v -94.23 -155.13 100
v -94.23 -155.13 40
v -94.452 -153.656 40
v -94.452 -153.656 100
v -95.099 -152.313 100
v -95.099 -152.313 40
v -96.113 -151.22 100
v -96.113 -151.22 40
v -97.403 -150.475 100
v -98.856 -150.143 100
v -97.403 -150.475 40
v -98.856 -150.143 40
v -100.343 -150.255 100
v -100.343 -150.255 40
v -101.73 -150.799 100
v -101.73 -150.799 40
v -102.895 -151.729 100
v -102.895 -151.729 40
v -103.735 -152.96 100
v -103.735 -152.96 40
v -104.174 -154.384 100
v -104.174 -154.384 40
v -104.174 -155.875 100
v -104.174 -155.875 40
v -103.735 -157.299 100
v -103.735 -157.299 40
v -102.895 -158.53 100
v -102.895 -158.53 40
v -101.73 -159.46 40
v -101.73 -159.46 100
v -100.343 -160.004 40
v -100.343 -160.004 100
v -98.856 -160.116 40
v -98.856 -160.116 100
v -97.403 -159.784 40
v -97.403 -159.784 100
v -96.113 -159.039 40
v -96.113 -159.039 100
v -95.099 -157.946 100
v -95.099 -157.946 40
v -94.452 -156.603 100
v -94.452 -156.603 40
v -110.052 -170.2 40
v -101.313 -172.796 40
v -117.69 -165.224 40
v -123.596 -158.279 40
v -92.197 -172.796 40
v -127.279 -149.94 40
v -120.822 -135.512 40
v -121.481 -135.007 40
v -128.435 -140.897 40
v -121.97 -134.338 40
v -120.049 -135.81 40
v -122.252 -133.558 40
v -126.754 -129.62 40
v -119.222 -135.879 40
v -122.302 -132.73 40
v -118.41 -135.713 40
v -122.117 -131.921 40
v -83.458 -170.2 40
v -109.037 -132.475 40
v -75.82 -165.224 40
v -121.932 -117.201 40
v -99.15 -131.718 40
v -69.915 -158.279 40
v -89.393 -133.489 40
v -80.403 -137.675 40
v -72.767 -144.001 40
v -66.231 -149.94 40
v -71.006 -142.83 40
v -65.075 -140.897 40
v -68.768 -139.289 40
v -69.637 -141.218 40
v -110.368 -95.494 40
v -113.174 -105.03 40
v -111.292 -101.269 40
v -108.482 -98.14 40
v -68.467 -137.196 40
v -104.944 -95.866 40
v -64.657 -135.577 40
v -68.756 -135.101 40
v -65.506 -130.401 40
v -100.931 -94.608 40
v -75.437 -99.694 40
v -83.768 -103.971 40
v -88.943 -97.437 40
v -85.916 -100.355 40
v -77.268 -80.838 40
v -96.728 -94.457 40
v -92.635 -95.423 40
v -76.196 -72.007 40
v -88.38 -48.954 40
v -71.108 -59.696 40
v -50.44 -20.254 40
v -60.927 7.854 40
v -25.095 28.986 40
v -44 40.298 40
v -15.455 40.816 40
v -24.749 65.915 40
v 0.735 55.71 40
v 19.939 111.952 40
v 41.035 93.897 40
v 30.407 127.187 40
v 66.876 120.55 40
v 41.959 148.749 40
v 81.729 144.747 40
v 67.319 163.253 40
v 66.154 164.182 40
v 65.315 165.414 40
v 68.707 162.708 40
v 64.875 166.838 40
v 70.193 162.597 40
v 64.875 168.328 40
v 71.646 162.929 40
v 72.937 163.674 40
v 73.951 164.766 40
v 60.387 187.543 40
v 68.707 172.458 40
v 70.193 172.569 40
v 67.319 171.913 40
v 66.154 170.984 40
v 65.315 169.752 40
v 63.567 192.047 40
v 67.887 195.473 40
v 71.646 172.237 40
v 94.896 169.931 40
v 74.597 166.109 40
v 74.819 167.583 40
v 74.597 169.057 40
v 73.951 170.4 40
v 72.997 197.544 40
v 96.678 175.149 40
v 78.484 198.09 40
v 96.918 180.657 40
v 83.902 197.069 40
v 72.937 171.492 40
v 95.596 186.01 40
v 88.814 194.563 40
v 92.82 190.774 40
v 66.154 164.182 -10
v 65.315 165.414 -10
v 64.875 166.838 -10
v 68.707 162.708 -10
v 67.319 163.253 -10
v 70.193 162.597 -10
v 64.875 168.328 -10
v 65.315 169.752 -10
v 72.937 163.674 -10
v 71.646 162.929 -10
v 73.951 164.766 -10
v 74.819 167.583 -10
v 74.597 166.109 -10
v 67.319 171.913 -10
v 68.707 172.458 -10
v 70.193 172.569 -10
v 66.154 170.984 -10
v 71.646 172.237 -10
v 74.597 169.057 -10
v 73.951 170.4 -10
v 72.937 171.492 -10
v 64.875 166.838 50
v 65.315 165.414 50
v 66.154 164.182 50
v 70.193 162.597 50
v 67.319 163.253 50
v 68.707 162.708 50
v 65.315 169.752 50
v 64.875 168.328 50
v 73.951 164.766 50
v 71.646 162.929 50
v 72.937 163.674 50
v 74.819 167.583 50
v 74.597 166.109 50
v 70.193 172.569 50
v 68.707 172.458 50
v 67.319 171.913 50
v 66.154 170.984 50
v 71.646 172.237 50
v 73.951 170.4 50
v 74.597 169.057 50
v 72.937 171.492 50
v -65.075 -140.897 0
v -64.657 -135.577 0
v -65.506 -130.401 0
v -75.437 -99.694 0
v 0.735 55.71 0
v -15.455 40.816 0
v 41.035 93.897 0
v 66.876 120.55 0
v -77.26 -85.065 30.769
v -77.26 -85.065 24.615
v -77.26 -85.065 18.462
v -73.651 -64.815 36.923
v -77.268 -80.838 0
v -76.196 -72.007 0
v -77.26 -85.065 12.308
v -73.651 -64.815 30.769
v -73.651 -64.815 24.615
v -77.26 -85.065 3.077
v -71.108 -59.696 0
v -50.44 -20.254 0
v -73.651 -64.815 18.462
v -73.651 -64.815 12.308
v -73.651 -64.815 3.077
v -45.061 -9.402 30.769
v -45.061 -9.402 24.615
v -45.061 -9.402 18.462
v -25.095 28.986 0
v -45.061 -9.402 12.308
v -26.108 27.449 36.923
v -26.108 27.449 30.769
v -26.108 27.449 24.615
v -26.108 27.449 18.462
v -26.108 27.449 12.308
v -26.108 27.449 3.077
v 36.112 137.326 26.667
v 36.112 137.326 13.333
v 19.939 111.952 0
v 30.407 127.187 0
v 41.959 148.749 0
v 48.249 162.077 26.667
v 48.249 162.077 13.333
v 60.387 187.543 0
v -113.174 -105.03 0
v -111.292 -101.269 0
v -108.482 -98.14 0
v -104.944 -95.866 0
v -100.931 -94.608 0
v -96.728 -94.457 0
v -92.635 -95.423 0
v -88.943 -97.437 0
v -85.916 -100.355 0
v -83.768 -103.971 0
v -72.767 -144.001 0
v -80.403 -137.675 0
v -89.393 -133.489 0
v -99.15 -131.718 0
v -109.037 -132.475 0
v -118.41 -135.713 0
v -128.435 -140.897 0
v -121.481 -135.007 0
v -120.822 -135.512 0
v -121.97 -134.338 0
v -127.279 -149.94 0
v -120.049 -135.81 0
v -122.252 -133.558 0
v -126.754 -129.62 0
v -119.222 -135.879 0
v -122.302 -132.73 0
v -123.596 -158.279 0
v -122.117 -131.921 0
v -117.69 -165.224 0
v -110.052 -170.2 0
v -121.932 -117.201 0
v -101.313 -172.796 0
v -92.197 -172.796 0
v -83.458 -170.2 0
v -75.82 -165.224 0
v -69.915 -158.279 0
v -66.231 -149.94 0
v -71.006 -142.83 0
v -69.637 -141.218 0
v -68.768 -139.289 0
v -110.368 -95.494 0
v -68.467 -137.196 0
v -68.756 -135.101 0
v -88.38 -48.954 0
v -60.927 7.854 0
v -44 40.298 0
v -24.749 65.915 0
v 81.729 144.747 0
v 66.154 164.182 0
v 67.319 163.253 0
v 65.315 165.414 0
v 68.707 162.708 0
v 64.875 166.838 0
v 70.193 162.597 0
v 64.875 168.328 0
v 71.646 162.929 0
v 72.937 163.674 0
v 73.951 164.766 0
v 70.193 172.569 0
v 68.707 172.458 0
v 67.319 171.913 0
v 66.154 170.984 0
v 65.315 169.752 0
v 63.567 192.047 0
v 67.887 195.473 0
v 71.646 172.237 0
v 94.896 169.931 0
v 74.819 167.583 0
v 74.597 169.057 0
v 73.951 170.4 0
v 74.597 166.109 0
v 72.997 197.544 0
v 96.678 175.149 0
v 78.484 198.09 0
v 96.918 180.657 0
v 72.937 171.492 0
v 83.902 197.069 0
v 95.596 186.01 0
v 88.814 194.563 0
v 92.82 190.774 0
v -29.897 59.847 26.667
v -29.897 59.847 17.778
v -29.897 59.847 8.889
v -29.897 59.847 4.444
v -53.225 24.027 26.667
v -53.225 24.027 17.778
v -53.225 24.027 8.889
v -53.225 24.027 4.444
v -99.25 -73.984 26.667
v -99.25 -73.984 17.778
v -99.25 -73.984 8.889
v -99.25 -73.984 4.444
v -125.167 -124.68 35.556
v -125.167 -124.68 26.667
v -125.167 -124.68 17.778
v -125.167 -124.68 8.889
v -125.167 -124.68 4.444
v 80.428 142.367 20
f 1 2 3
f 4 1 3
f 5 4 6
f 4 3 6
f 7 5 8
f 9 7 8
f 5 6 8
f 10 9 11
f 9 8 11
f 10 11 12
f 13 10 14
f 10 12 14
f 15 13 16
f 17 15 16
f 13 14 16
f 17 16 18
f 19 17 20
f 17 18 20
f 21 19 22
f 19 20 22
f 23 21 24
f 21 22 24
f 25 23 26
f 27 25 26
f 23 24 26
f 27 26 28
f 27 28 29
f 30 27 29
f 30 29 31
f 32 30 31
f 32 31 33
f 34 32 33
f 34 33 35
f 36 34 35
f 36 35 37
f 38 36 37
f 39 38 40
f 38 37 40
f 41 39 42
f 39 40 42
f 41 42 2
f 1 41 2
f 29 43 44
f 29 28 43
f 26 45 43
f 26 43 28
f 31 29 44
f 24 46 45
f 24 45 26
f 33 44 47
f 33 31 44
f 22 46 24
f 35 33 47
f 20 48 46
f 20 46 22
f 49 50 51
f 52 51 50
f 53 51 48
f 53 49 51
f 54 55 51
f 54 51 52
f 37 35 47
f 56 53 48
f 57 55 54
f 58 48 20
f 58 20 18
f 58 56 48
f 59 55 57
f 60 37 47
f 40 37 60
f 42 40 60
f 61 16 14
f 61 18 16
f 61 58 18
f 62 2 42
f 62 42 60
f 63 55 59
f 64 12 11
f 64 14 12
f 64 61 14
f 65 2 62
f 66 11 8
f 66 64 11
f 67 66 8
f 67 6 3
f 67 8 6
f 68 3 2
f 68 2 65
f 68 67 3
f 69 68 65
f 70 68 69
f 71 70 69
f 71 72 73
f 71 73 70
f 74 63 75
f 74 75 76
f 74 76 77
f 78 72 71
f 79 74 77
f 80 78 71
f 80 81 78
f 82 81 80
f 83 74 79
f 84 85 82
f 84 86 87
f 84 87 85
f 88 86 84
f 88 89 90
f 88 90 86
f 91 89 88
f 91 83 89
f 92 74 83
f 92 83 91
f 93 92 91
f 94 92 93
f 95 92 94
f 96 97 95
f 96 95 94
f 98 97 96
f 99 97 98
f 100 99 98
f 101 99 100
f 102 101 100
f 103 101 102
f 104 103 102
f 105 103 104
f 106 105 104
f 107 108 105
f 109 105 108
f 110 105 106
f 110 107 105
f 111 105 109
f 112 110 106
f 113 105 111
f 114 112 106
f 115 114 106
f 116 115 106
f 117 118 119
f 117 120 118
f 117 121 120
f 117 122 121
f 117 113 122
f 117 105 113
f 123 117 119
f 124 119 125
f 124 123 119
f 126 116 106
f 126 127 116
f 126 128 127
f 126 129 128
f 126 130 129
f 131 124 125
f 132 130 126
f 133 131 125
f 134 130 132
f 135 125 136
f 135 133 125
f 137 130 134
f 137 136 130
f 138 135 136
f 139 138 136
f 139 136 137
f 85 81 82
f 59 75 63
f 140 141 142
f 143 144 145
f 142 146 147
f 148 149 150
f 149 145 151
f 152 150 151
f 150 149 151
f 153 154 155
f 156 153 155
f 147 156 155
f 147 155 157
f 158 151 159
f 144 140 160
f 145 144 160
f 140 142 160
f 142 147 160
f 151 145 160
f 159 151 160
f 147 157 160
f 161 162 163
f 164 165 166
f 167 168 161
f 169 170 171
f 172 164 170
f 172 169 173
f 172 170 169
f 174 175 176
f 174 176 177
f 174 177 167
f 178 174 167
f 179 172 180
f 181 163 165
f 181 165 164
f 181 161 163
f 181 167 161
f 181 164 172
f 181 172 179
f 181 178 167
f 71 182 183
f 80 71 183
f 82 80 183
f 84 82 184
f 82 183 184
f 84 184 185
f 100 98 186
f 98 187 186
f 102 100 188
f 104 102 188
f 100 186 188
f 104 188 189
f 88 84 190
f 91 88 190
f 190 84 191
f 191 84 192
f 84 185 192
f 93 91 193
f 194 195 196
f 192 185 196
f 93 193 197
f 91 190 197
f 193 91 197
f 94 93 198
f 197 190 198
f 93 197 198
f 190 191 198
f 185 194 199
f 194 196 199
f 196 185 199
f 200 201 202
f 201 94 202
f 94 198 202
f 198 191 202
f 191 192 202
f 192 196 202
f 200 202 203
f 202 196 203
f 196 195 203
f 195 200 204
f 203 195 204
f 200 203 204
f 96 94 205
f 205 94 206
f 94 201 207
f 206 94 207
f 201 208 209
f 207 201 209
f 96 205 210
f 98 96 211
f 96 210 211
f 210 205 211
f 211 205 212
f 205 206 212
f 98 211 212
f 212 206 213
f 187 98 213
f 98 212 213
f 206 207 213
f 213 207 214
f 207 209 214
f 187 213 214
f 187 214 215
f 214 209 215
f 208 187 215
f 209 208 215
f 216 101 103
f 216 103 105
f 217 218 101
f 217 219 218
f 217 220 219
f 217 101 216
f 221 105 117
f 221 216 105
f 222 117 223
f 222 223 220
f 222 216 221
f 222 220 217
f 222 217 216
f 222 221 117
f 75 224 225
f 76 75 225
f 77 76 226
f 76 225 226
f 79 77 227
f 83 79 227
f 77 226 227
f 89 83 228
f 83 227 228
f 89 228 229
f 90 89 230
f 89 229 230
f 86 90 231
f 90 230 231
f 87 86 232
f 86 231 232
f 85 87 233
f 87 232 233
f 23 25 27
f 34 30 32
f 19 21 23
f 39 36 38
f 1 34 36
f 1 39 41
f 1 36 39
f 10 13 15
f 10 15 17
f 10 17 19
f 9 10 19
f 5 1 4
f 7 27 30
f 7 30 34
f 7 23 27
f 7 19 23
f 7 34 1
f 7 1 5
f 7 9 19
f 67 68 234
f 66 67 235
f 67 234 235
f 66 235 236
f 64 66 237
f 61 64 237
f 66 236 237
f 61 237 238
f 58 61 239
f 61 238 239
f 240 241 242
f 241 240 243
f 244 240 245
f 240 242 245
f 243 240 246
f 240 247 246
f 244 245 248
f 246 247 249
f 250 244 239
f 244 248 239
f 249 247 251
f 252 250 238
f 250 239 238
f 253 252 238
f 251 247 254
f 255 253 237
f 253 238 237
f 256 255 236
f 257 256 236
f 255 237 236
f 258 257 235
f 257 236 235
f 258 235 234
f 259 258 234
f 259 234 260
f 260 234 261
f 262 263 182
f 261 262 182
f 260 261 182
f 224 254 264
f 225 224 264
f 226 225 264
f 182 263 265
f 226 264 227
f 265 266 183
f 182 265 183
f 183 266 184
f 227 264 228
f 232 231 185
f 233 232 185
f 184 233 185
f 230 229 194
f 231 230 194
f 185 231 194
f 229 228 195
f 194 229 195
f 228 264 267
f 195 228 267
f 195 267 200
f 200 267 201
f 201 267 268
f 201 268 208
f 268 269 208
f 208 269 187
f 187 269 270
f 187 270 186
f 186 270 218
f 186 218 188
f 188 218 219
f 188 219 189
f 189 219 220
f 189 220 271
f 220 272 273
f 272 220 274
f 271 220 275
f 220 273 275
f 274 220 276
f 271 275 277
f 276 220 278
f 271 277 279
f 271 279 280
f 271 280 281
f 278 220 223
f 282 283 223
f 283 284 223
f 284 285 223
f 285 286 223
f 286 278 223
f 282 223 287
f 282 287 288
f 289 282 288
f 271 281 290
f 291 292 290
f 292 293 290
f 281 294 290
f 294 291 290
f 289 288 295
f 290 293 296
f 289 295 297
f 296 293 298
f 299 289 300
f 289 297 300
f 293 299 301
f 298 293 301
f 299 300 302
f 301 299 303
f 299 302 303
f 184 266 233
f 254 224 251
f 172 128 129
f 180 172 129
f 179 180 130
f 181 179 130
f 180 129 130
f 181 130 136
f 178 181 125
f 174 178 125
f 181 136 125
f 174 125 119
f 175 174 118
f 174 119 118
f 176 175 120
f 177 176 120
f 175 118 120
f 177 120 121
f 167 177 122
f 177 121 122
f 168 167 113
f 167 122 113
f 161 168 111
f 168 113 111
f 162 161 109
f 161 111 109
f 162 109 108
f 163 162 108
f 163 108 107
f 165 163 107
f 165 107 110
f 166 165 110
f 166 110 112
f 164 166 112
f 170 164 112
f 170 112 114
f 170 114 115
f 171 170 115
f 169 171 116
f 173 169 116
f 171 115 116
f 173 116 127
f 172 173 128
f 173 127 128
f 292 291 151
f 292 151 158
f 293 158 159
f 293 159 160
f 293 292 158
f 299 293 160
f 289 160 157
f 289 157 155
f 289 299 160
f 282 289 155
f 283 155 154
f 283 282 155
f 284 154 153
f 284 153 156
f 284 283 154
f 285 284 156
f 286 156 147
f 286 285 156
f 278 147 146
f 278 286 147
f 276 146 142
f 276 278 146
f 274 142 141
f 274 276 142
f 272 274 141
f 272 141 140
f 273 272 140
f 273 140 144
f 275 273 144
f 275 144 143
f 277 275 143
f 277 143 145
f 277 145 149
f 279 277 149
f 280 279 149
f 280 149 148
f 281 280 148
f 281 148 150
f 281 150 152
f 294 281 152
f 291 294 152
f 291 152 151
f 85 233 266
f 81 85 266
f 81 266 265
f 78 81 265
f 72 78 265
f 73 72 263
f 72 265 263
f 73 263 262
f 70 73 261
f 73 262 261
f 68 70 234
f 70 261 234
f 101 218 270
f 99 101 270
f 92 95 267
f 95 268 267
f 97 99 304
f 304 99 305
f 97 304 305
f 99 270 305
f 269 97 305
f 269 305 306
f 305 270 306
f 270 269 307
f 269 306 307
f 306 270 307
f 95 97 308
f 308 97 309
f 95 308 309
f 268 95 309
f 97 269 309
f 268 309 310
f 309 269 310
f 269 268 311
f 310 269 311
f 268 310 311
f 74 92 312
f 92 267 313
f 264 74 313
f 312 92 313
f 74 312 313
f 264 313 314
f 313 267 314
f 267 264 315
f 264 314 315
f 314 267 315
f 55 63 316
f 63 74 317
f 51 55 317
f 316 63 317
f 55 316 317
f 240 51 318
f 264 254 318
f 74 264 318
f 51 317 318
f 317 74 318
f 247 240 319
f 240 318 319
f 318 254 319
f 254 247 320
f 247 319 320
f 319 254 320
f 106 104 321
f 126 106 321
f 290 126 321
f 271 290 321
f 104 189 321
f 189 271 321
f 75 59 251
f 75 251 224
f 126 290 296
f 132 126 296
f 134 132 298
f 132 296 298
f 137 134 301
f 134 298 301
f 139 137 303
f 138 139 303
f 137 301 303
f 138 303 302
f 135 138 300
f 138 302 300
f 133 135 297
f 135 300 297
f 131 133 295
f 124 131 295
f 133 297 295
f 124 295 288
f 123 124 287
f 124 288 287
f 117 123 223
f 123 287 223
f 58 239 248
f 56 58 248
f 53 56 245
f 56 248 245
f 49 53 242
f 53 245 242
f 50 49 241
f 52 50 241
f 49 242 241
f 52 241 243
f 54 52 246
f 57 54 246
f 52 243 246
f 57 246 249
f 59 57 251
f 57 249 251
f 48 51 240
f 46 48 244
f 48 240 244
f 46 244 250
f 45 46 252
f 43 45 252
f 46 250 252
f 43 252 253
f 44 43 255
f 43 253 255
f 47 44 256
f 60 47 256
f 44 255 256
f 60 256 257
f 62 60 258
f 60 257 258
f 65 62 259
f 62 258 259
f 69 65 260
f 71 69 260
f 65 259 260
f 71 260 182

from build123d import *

# Parameters (mm, degrees)
BOSS_EXTRUDE1_DEPTH = 40
SKETCH3_R           = 5
BOSS_EXTRUDE3_DEPTH = 10
CUT_EXTRUDE1_DEPTH  = 40
BOSS_EXTRUDE6_START = -50
SKETCH3_2_R         = 5
BOSS_EXTRUDE6_DEPTH = 50
SKETCH4_R           = 5
BOSS_EXTRUDE7_DEPTH = 60


with BuildPart() as part:
    # Sketch1 → Boss-Extrude1 (new body)
    with BuildSketch(Plane.XY):
        with BuildLine():
            ThreePointArc((-128.435303347, -140.896902453), (-96.755149526, -173.125351057), (-65.074995705, -140.896902453))
            add(Edge.make_bspline(
                [(-65.074995705, -140.896902453), (-63.907652097, -135.87464552), (-66.35100912, -126.659238679), (-71.697657005, -112.128089654), (-76.334712316, -98.472209398), (-77.541709446, -84.207198732), (-76.961960819, -70.342092539), (-68.88579276, -55.69495944), (-58.213845257, -35.305524849), (-45.109839414, -10.285325139), (-33.851241856, 14.939291119), (-19.441261208, 38.761764832), (0.34611134, 54.846253057), (30.149690797, 83.353080433), (52.005250373, 104.155990976), (66.875865875, 120.550338304)],
                knots=[0, 0, 0, 0, 0.04686952, 0.090141713, 0.148581226, 0.183456914, 0.226900489, 0.278590854, 0.340349479, 0.448130788, 0.547901997, 0.604794059, 0.712230619, 0.788345355, 1, 1, 1, 1], degree=3))
            add(Edge.make_bspline(
                [(66.875865875, 120.550338304), (72.386556563, 127.19913785), (81.101735437, 144.070801532), (90.587580648, 160.476032838), (94.896483447, 169.931016127)],
                knots=[0, 0, 0, 0, 0.452321954, 1, 1, 1, 1], degree=3))
            ThreePointArc((94.896483447, 169.931016127), (86.447657386, 195.991479609), (60.387193905, 187.542653548))
            add(Edge.make_bspline(
                [(19.939027909, 111.952234191), (26.24809298, 119.800552758), (36.071780336, 136.393112866), (48.541442057, 162.180154607), (55.829036332, 179.301734236), (60.387193905, 187.542653548)],
                knots=[0, 0, 0, 0, 0.350645712, 0.671542658, 1, 1, 1, 1], degree=3))
            add(Edge.make_bspline(
                [(19.939027909, 111.952234191), (3.65232557, 94.329038748), (-20.249605672, 73.621931367), (-45.652429062, 39.041142074), (-58.842646897, 13.609703306), (-71.789487323, -18.071990564), (-87.738861669, -45.500334261), (-100.863433523, -79.921354986), (-115.452059141, -103.788445803), (-126.143907942, -125.769991297), (-128.340182149, -135.353702394), (-128.435303347, -140.896902453)],
                knots=[0, 0, 0, 0, 0.227860936, 0.297082932, 0.405625713, 0.498415505, 0.621398378, 0.705377541, 0.846798383, 0.88536092, 0.937345032, 0.937345032, 0.937345032, 0.937345032], degree=3))
        make_face()
    extrude(amount=BOSS_EXTRUDE1_DEPTH)

    # Sketch3 → Boss-Extrude3 (add)
    with BuildSketch(Plane.XY.offset(40)):
        with Locations((69.819387709, 167.582956348)):
            Circle(SKETCH3_R)
    extrude(amount=BOSS_EXTRUDE3_DEPTH)

    # Sketch2 → Cut-Extrude1 (cut)
    with BuildSketch(Plane(origin=(0, 0, 0), x_dir=(-1, 0, 0), z_dir=(0, 0, -1))):
        with BuildLine():
            ThreePointArc((68.756079477, -135.101198343), (69.135093574, -140.284053245), (72.767176325, -144.000719965))
            ThreePointArc((72.767176325, -144.000719965), (94.214636305, -132.290590151), (118.40985459, -135.71288353))
            ThreePointArc((118.40985459, -135.71288353), (121.480604985, -135.007019726), (122.117435387, -131.921213715))
            add(Edge.make_bspline(
                [(122.117435387, -131.921213715), (121.902241698, -131.121274345), (121.440830196, -129.570265663), (120.671868024, -127.192672605), (119.652569307, -124.170271778), (118.304661288, -120.363805326), (116.083389287, -114.1940152), (114.313518517, -109.046051235), (113.271974893, -105.380725172), (113.174364562, -105.029678695)],
                knots=[0.036199993, 0.036199993, 0.036199993, 0.036199993, 0.044998375, 0.052823255, 0.060648134, 0.076297892, 0.091947651, 0.123247168, 0.126550229, 0.126550229, 0.126550229, 0.126550229], degree=3))
            ThreePointArc((113.174364562, -105.029678695), (98.834885933, -94.391617828), (83.767621929, -103.971103295))
            add(Edge.make_bspline(
                [(83.767621929, -103.971103295), (83.587351822, -104.298739766), (81.914012514, -107.339065994), (79.505680761, -111.713780784), (76.624782808, -117.103856723), (74.514987608, -121.165521306), (72.523371571, -125.181904734), (70.751114993, -129.17446861), (69.536178497, -132.477867128), (68.933551478, -134.470064331), (68.756079477, -135.101198343)],
                knots=[0.787262055, 0.787262055, 0.787262055, 0.787262055, 0.790799641, 0.820108719, 0.834763258, 0.849417797, 0.864072336, 0.878726875, 0.893381414, 0.900142659, 0.900142659, 0.900142659, 0.900142659], degree=3))
        make_face()
    extrude(amount=-CUT_EXTRUDE1_DEPTH, mode=Mode.SUBTRACT)

    # Sketch3<2> → Boss-Extrude6 (add)
    with BuildSketch(Plane.XY.offset(40).offset(BOSS_EXTRUDE6_START)):
        with Locations((69.819387709, 167.582956348)):
            Circle(SKETCH3_2_R)
    extrude(amount=BOSS_EXTRUDE6_DEPTH)

    # Sketch4 → Boss-Extrude7 (add)
    with BuildSketch(Plane.XY.offset(40)):
        with Locations((-99.230093204, -155.129512749)):
            Circle(SKETCH4_R)
    extrude(amount=BOSS_EXTRUDE7_DEPTH)


solid = part.part
